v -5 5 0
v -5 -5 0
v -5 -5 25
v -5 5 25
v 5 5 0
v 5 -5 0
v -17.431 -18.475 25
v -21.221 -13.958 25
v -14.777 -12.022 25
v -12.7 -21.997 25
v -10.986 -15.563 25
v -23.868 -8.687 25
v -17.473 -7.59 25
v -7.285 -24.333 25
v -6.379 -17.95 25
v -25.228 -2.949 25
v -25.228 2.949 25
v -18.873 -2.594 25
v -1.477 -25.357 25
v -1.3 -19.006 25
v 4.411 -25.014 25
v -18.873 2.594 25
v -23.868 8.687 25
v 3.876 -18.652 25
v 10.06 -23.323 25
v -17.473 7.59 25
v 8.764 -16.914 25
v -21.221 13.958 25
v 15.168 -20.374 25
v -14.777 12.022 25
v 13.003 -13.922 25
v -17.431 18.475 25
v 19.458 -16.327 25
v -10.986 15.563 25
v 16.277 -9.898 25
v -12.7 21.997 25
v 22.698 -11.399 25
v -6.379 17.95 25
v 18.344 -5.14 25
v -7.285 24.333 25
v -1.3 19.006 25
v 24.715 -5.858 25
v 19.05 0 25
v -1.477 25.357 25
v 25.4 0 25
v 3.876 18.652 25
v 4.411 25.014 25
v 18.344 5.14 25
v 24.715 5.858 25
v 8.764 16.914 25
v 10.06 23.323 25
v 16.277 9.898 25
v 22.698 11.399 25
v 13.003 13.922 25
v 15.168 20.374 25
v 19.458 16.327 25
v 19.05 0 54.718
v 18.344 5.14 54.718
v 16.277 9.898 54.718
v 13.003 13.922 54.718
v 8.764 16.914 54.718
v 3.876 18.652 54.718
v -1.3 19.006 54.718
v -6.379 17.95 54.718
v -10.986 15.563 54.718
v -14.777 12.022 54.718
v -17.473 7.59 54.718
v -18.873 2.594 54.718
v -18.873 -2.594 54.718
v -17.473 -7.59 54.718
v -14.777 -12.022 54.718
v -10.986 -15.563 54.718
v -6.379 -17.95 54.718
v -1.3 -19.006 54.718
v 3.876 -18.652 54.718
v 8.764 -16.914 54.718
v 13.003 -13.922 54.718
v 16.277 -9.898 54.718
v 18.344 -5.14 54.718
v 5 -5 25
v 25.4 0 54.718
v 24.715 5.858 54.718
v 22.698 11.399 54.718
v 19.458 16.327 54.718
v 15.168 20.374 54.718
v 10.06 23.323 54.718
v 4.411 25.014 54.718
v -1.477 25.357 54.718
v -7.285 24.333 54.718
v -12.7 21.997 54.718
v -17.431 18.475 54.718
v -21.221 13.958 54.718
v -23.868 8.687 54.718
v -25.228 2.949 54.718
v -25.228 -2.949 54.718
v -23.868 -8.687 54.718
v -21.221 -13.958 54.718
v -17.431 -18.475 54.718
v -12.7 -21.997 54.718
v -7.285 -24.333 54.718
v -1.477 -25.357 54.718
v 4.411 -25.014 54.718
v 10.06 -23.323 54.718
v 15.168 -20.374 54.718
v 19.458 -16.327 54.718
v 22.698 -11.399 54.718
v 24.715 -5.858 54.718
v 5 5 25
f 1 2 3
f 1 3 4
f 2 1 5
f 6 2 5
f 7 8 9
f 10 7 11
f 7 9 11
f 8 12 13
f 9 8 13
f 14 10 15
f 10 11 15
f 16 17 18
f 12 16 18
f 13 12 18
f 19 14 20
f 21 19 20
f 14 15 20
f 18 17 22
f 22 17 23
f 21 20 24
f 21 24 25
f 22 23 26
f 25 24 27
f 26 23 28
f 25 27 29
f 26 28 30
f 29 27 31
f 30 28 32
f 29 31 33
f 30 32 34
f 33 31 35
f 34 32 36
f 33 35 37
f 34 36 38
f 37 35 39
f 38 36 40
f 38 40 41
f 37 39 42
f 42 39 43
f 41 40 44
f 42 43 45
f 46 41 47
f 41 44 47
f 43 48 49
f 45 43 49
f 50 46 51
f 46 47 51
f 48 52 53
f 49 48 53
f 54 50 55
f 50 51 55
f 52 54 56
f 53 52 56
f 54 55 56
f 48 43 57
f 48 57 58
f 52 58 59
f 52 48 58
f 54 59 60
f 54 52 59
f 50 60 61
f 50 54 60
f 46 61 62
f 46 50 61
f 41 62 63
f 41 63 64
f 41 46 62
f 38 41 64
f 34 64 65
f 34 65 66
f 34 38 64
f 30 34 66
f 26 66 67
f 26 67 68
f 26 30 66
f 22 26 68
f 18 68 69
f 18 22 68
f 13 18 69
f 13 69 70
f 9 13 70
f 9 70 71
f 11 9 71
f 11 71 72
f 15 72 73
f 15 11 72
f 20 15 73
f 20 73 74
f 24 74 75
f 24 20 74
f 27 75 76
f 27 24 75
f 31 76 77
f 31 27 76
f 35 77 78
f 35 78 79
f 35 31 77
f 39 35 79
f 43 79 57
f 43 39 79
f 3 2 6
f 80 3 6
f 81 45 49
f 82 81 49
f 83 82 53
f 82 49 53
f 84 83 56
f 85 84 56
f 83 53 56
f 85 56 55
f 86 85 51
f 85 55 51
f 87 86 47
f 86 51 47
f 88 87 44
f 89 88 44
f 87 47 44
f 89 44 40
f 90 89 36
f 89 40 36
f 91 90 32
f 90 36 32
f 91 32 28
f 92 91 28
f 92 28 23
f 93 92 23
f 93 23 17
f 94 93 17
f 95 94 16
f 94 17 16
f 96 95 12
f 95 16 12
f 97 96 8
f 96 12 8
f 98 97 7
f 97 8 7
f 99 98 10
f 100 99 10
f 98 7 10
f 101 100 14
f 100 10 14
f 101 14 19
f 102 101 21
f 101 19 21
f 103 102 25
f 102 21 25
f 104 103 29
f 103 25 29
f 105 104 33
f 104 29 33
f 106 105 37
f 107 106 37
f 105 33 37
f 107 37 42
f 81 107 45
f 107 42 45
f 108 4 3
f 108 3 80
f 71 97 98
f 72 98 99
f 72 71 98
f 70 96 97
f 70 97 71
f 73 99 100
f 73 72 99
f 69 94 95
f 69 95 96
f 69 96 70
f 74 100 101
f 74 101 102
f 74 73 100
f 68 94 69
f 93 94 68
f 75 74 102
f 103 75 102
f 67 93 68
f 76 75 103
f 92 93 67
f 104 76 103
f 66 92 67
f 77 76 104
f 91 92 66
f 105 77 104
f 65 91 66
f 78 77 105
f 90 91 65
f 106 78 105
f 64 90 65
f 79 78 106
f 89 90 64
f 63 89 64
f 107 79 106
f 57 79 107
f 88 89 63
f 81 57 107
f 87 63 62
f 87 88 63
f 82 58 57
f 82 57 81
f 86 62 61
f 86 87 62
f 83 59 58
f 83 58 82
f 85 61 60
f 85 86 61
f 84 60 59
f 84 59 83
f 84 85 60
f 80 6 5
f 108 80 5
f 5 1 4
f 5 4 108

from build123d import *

# Parameters (mm, degrees)
F0_W     = 10
F0_H     = 10
F1_DEPTH = 25
F2_R     = 25.4
F2_R_2   = 19.05
F3_DEPTH = 29.718


with BuildPart() as f1:
    # F0 (on Top) → F1 (new body)
    with BuildSketch(Plane.XY):
        Rectangle(F0_W, F0_H)
    extrude(amount=F1_DEPTH)


with BuildPart() as f3:
    # F2 (on face) → F3 (new body)
    with BuildSketch(Plane.XY.offset(25)):
        Circle(F2_R)
        Circle(F2_R_2, mode=Mode.SUBTRACT)
    extrude(amount=F3_DEPTH)


solid = Compound([f1.part, f3.part])
